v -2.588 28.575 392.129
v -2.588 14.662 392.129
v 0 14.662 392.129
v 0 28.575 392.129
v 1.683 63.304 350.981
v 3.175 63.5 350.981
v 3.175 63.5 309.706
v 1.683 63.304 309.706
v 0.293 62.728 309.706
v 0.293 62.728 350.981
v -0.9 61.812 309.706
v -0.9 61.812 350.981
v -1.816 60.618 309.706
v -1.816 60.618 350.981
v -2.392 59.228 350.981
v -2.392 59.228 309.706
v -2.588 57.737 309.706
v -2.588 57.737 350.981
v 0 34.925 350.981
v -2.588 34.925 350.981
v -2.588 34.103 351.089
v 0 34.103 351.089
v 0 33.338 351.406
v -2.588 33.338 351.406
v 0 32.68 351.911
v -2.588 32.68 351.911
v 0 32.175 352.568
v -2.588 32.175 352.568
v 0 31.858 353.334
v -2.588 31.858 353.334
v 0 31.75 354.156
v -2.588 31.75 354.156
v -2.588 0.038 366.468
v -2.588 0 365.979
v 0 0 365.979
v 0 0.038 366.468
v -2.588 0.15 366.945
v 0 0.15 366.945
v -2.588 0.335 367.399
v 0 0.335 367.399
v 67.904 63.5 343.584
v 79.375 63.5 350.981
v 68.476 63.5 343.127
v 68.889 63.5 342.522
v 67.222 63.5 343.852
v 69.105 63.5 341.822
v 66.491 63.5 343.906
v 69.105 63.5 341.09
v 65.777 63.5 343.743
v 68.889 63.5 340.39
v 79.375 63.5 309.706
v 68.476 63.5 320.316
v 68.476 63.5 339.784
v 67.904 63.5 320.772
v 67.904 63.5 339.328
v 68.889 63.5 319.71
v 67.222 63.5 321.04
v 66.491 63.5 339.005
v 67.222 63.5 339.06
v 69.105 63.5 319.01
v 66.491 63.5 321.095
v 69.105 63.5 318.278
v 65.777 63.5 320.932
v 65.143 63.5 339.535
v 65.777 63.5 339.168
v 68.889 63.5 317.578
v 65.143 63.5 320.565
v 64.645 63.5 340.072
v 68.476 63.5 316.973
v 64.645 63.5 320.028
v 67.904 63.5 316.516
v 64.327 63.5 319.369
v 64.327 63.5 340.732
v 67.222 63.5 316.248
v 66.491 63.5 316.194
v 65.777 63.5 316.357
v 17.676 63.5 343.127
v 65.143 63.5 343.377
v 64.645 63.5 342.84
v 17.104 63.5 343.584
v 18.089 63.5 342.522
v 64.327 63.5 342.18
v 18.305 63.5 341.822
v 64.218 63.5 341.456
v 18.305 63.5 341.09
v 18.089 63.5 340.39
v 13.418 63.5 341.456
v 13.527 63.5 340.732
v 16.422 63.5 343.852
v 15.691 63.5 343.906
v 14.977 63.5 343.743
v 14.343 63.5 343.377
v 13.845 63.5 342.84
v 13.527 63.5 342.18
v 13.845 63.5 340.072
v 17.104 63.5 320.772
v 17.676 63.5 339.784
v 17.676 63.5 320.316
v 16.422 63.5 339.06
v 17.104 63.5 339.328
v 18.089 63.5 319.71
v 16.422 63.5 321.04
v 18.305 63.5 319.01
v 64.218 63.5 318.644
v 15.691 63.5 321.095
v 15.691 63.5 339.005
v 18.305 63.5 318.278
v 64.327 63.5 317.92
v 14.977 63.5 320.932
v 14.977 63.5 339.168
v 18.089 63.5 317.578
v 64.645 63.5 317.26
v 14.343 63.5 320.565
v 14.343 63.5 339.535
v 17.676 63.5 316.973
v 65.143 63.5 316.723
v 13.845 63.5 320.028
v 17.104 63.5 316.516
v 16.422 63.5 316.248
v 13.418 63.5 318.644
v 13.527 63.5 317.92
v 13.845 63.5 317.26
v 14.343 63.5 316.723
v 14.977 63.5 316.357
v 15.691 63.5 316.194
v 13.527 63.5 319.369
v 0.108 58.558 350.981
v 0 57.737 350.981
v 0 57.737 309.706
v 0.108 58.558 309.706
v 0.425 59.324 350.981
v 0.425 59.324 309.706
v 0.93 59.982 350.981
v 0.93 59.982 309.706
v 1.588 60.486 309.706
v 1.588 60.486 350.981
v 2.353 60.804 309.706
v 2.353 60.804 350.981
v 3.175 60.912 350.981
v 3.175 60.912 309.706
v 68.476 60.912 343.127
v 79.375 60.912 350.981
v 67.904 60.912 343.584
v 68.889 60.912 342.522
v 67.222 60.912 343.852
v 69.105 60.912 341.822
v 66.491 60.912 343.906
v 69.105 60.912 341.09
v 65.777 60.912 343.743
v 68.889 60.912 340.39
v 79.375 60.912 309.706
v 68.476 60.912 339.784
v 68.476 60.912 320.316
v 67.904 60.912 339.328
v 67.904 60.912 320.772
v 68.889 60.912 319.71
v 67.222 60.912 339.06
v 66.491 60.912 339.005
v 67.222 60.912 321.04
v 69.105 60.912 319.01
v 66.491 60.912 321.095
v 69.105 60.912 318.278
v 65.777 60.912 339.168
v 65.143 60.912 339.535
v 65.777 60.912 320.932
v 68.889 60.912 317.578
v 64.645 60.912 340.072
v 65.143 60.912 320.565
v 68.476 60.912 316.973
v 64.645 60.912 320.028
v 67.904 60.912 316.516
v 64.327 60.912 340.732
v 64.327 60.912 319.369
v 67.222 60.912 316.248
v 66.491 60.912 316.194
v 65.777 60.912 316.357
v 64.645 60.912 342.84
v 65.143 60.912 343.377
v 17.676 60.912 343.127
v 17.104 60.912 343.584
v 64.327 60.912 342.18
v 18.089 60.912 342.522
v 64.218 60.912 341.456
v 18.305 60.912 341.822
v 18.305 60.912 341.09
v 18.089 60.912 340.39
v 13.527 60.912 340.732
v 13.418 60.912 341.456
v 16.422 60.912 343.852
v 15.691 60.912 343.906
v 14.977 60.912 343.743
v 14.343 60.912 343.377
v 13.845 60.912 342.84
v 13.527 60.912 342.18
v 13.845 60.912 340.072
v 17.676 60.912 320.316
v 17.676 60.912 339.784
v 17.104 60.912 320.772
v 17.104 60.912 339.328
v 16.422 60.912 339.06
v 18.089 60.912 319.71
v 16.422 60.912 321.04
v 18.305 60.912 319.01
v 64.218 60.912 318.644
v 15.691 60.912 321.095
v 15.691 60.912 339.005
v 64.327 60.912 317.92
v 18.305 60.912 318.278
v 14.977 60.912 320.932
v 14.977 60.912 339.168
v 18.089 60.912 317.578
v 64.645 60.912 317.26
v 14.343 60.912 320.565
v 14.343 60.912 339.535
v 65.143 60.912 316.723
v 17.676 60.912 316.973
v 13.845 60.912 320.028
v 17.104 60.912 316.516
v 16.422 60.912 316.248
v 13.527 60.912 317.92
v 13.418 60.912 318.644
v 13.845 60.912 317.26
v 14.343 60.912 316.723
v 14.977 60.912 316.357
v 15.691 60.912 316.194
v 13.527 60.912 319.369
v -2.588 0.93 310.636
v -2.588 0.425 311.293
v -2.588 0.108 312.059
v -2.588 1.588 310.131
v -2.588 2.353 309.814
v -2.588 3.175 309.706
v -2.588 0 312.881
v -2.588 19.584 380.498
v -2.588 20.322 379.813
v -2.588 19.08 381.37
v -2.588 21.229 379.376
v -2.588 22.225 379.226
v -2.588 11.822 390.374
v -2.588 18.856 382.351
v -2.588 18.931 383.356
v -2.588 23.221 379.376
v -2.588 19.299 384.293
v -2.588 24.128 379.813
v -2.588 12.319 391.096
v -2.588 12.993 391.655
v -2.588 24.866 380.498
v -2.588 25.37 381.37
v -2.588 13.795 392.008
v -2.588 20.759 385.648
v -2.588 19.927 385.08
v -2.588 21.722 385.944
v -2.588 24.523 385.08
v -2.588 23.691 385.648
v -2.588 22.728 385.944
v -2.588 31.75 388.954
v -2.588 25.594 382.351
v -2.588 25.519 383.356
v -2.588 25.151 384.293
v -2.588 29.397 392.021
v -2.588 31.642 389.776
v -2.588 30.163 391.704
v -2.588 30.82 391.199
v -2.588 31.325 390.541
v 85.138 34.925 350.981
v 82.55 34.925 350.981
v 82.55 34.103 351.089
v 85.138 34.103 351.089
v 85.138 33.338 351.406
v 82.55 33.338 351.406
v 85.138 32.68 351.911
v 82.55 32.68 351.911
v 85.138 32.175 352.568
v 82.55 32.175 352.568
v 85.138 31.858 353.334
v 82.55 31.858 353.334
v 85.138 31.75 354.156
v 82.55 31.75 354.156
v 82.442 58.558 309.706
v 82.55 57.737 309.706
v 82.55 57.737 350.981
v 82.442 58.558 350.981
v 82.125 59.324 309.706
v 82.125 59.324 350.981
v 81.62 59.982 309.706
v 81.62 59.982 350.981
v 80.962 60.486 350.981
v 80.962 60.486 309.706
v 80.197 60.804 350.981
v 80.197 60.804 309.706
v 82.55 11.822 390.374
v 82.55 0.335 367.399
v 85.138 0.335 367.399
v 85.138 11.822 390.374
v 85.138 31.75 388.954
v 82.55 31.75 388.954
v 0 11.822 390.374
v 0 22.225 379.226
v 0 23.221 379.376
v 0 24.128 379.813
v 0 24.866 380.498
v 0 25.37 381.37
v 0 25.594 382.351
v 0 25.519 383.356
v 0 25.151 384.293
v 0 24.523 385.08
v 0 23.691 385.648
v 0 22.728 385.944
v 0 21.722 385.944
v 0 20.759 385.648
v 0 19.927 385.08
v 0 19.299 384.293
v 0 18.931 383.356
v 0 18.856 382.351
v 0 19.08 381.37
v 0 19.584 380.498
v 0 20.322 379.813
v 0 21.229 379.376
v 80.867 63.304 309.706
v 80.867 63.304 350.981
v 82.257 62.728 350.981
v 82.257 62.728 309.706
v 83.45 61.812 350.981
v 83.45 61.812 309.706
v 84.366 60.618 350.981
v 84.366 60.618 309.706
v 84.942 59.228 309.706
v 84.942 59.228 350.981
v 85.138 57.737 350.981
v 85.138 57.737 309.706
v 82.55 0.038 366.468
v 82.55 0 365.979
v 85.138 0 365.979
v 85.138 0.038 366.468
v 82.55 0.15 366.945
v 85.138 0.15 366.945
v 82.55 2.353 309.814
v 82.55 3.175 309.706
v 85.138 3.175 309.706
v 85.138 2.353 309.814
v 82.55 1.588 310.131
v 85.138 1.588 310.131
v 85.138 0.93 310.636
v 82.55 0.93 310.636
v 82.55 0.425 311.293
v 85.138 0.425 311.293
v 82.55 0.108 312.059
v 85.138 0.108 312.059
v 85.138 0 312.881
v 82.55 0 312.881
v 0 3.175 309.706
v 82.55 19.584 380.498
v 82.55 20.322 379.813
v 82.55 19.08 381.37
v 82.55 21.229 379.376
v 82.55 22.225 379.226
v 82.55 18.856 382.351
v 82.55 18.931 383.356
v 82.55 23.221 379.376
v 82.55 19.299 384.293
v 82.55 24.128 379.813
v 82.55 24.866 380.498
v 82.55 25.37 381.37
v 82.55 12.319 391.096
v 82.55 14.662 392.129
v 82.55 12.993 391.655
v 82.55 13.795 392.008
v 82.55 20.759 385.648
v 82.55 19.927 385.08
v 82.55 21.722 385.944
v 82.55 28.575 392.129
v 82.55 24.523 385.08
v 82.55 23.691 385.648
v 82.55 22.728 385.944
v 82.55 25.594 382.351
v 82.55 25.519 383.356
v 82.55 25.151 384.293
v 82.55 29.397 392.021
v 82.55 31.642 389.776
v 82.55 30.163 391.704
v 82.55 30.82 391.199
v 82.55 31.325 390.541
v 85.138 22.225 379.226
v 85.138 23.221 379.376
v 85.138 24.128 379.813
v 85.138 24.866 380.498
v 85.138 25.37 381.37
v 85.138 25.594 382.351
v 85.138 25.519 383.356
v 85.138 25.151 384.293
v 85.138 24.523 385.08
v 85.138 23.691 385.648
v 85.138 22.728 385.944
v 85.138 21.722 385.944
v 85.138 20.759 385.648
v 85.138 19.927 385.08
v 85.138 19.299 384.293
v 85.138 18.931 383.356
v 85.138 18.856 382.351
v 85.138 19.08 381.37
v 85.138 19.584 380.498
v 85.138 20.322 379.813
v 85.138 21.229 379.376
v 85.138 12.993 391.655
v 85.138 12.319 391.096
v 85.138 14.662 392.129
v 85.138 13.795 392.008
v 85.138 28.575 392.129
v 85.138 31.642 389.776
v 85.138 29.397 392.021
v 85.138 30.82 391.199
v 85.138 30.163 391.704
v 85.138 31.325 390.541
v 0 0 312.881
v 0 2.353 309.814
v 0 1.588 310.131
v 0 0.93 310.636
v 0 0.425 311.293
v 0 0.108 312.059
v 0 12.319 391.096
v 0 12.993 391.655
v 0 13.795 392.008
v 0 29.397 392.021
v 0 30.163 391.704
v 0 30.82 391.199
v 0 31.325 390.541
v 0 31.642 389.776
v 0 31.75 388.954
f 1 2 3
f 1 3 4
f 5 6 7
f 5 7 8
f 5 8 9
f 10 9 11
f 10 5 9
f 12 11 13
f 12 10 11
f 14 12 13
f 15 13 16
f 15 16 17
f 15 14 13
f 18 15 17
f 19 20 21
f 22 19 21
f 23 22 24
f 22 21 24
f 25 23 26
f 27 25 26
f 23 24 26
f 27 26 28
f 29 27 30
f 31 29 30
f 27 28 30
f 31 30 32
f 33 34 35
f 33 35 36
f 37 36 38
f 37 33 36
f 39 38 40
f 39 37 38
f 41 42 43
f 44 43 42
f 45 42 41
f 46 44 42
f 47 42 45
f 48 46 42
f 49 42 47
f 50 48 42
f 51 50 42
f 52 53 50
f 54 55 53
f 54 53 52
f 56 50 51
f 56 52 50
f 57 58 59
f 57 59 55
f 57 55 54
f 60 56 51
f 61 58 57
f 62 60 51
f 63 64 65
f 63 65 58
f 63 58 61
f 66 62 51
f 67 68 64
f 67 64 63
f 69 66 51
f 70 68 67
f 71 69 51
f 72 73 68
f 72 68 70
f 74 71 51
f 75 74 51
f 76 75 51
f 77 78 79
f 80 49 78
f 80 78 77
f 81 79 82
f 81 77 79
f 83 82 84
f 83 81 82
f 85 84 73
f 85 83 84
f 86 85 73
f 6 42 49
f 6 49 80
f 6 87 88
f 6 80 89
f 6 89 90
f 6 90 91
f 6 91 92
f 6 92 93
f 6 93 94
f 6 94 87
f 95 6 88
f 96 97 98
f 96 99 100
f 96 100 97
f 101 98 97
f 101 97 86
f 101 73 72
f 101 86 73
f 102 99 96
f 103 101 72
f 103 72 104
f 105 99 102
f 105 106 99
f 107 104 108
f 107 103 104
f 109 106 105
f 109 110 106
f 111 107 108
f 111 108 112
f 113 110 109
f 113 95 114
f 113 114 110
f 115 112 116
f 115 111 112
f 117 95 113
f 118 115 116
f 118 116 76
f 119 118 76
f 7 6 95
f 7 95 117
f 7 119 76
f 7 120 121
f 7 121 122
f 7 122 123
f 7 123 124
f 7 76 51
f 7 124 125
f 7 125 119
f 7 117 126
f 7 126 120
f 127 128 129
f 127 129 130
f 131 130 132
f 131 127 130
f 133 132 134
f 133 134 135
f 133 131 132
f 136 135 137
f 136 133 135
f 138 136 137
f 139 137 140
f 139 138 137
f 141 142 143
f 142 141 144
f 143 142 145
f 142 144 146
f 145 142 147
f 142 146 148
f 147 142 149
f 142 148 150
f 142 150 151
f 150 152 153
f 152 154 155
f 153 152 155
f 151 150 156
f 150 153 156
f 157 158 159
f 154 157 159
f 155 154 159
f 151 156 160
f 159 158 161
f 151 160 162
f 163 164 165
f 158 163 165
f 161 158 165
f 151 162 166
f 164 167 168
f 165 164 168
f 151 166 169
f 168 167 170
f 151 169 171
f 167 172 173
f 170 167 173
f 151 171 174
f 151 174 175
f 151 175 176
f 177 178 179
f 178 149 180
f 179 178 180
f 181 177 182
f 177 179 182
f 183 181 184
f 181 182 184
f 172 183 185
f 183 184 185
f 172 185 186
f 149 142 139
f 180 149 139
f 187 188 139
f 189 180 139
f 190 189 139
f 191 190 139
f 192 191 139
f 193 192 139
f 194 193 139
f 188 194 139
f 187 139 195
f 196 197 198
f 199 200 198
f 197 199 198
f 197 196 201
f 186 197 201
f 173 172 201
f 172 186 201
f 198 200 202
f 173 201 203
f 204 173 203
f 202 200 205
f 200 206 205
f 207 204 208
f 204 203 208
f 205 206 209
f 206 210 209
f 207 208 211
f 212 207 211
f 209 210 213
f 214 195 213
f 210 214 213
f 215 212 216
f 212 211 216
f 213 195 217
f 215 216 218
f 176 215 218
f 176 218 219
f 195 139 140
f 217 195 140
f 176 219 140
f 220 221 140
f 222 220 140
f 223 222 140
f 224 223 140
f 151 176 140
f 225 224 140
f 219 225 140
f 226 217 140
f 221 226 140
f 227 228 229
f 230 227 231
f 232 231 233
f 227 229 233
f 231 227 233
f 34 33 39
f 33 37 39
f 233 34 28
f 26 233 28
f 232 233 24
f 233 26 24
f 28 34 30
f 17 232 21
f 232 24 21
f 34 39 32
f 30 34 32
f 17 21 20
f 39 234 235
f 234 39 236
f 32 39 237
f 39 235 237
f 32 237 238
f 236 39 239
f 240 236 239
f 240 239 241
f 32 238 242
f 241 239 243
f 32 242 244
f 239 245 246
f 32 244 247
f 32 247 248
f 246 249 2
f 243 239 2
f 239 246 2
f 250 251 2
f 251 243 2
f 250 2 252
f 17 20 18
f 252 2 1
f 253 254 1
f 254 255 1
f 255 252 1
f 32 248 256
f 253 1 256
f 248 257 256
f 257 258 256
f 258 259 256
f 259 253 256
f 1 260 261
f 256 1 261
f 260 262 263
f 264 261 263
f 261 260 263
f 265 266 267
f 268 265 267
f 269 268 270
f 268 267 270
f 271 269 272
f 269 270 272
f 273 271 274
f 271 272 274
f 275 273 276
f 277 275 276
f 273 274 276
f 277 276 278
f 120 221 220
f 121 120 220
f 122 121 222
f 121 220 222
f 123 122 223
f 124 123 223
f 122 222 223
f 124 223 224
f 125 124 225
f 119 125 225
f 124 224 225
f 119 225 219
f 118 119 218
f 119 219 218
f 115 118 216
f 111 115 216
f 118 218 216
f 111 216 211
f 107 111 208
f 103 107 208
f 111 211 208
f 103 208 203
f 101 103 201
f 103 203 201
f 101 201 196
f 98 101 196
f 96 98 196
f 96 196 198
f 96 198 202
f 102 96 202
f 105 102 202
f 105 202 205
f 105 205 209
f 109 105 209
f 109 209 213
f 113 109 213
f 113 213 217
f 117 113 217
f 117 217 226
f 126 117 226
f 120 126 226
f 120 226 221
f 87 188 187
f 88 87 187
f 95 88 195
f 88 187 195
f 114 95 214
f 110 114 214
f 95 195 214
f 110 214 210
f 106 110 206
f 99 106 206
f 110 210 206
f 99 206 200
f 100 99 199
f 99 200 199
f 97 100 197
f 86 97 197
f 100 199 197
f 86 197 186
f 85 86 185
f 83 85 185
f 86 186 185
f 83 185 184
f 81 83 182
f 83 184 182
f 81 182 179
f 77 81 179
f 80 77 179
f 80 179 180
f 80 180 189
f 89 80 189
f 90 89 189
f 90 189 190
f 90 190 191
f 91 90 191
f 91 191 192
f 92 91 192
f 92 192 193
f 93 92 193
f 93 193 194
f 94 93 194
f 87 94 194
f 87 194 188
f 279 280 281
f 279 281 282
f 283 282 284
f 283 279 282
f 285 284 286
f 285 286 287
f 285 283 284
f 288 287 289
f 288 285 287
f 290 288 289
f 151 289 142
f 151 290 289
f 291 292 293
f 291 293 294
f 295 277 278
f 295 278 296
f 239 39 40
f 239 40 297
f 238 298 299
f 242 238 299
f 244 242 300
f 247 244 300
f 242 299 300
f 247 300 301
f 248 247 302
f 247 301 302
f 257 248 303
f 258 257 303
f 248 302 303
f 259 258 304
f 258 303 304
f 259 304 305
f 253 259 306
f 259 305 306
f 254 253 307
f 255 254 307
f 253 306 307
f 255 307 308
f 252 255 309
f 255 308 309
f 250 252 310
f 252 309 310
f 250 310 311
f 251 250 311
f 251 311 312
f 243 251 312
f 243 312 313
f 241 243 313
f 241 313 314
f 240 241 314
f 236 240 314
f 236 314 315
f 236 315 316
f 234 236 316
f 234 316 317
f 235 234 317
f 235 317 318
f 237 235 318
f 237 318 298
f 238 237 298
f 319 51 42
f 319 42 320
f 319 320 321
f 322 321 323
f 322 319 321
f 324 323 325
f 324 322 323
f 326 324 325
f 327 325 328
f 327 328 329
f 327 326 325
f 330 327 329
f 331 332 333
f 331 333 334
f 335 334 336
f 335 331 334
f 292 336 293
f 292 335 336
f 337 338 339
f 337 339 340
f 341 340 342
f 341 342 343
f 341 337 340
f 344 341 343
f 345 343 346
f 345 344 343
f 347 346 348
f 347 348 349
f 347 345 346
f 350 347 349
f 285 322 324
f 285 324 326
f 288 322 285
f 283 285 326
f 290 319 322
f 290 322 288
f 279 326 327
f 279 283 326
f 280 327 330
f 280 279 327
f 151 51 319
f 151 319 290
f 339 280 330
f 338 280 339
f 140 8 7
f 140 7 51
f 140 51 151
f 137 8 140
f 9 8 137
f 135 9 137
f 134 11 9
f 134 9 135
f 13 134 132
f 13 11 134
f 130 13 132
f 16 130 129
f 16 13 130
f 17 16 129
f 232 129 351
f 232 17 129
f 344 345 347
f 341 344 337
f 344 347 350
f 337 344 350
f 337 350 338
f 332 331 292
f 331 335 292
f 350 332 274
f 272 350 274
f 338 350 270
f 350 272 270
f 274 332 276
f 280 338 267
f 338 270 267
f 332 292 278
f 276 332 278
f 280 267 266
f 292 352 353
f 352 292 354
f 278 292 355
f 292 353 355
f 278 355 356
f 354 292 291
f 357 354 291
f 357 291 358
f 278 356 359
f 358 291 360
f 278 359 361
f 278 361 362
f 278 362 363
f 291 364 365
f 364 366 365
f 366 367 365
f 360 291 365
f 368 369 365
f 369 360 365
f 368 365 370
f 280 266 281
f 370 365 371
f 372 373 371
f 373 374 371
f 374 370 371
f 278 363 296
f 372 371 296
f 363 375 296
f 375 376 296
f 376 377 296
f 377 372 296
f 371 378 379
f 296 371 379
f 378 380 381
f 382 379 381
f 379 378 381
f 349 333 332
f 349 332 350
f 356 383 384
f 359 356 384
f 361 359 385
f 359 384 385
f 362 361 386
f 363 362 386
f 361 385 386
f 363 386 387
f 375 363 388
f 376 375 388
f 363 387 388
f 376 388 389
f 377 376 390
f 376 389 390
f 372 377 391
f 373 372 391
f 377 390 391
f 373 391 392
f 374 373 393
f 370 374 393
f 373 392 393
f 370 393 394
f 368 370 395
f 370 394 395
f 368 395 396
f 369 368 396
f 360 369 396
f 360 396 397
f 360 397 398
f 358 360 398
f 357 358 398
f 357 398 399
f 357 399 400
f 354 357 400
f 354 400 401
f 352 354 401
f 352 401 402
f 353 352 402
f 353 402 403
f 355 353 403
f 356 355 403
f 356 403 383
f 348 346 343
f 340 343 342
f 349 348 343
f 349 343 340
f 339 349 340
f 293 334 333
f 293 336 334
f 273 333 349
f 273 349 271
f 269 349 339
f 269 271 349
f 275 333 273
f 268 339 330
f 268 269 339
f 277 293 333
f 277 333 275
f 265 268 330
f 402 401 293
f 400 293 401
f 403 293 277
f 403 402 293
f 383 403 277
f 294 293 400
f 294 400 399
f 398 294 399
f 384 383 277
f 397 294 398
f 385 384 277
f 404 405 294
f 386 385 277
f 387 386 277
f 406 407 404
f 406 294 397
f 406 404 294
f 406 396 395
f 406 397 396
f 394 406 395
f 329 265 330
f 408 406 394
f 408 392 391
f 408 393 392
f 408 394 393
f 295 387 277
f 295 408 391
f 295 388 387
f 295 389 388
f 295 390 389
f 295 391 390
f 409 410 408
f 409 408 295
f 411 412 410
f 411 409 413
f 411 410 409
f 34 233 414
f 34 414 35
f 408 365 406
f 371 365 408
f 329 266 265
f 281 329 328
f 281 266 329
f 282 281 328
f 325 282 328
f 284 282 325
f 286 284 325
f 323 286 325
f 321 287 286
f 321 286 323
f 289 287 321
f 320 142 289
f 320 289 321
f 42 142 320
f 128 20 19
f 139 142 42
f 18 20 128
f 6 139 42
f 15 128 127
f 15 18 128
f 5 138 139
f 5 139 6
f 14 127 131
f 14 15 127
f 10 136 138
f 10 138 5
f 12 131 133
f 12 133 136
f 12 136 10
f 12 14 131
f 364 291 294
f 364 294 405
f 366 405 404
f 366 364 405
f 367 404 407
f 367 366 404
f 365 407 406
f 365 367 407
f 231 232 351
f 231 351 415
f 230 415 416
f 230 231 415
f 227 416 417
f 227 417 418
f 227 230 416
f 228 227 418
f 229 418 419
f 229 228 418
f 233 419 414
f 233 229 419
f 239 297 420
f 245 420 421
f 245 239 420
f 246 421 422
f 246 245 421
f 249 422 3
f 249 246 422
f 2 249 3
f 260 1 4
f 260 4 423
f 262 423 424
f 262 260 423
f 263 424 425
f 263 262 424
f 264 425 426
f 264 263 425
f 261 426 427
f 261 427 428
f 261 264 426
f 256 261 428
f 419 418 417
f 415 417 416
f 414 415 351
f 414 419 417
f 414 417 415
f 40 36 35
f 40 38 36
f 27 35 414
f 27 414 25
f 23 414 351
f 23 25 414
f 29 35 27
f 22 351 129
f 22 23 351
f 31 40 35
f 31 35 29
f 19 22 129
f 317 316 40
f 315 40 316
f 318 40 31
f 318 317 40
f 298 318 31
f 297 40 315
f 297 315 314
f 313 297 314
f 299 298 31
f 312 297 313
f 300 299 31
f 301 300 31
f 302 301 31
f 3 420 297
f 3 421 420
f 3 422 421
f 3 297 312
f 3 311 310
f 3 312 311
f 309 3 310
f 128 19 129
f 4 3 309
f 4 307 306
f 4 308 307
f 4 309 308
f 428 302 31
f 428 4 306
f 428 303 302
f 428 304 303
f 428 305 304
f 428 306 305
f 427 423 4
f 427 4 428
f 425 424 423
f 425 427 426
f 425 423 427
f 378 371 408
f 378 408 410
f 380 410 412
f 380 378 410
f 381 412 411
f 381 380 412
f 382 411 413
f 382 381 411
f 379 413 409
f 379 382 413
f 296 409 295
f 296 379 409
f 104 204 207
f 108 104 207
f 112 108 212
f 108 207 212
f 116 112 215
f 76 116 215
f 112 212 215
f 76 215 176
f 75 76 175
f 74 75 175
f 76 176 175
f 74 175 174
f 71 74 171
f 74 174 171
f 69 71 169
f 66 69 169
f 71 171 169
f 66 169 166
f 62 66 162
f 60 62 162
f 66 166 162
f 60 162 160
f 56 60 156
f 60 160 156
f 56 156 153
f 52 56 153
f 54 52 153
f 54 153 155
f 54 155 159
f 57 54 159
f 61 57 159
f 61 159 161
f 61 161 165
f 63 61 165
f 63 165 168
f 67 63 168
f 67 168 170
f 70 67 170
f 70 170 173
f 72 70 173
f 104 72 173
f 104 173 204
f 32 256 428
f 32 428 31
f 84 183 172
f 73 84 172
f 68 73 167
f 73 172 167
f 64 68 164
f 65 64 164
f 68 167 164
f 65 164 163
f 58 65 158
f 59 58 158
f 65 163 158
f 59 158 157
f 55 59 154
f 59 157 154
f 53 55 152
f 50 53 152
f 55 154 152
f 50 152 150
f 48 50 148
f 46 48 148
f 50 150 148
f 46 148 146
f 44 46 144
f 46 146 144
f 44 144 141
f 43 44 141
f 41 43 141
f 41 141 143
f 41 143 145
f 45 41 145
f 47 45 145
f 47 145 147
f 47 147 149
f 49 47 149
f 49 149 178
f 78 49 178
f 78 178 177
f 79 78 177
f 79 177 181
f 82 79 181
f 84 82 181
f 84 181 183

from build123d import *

# Parameters (mm, degrees)
SKETCH1_W                    = 41.275
SKETCH1_H                    = 2.58826
BASE_FLANGE1_DEPTH           = 82.55
EDGE_FLANGE1_STRIP_W         = 16.70304
EDGE_FLANGE1_STRIP_H         = 2.58826
EDGE_FLANGE1_STRIP_CUT_DEPTH = 41.275
EDGE_FLANGE1_DEPTH           = 41.275
EDGE_FLANGE1_START           = 2.58826
EDGE_FLANGE1_FLAT_DEPTH      = 2.58826
EDGE_FLANGE2_STRIP_W         = 16.70304
EDGE_FLANGE2_STRIP_H         = 2.58826
EDGE_FLANGE2_STRIP_CUT_DEPTH = 41.275
EDGE_FLANGE2_DEPTH           = 41.275
EDGE_FLANGE2_START           = 2.58826
EDGE_FLANGE2_FLAT_DEPTH      = 2.58826
F_1_4_CLEARANCE_HOLE1_D      = 6.7564
F_10_0_1935_DIAMETER_HOLE1_D = 4.9149
SKETCH19_W                   = 9.191105822
SKETCH19_H                   = 31.75
CUT_EXTRUDE1_DEPTH           = 416.675275559
FILLET2_START                = -2.58826
FILLET2_DEPTH                = 87.72652
FILLET2_2_DEPTH              = 2.58826
FILLET2_START_2              = 82.55
FILLET2_3_DEPTH              = 2.58826


with BuildPart() as part:
    # Base-Flange1: sheet metal written as solids
    # Sketch1 → Base-Flange1 (new body)
    with BuildSketch(Plane(origin=(0, 0, 0), x_dir=(0, 0, -1), z_dir=(1, 0, 0))):
        with Locations((-330.343394178, 62.20587)):
            Rectangle(SKETCH1_W, SKETCH1_H)
    extrude(amount=BASE_FLANGE1_DEPTH)

    # Edge-Flange1: sheet metal written as solids
    # Edge-Flange1 strip (on a plane across the edge) → Edge-Flange1 strip cut (cut)
    with BuildSketch(Plane(origin=(82.55, 60.91174, 309.705894178), x_dir=(-1, 0, 0), z_dir=(0, 0, 1))):
        with Locations((-5.17652, -1.29413)):
            Rectangle(EDGE_FLANGE1_STRIP_W, EDGE_FLANGE1_STRIP_H)
    extrude(amount=EDGE_FLANGE1_STRIP_CUT_DEPTH, mode=Mode.SUBTRACT)

    # Edge-Flange1 bend section (on a plane across the edge) → Edge-Flange1 (add)
    with BuildSketch(Plane(origin=(82.55, 60.91174, 309.705894178), x_dir=(-1, 0, 0), z_dir=(0, 0, 1))):
        with BuildLine():
            Line((-2.58826, 3.175), (0, 3.175))
            ThreePointArc((0, 3.175), (0.92993597, 0.92993597), (3.175, 0))
            Line((3.175, 0), (3.175, -2.58826))
            ThreePointArc((3.175, -2.58826), (-0.900240228, -0.900240228), (-2.58826, 3.175))
        make_face()
    extrude(amount=EDGE_FLANGE1_DEPTH)

    # Edge-Flange1 profile (on flange) → Edge-Flange1 flat (add)
    with BuildSketch(Plane(origin=(82.55, 60.91174, 0), x_dir=(0, 0, 1), z_dir=(1, 0, 0)).offset(EDGE_FLANGE1_START)):
        Polygon((350.980894178, 3.175), (350.980894178, 12.7), (350.980894178, 29.16174), (401.32, 29.16174), (401.32, 60.91174), (309.705894178, 60.91174), (309.705894178, 12.7), (309.705894178, 3.175), align=None)
    extrude(amount=-EDGE_FLANGE1_FLAT_DEPTH)

    # Edge-Flange2: sheet metal written as solids
    # Edge-Flange2 strip (on a plane across the edge) → Edge-Flange2 strip cut (cut)
    with BuildSketch(Plane(origin=(0, 60.91174, 350.980894178), x_dir=(1, 0, 0), z_dir=(0, 0, -1))):
        with Locations((-5.17652, -1.29413)):
            Rectangle(EDGE_FLANGE2_STRIP_W, EDGE_FLANGE2_STRIP_H)
    extrude(amount=EDGE_FLANGE2_STRIP_CUT_DEPTH, mode=Mode.SUBTRACT)

    # Edge-Flange2 bend section (on a plane across the edge) → Edge-Flange2 (add)
    with BuildSketch(Plane(origin=(0, 60.91174, 350.980894178), x_dir=(1, 0, 0), z_dir=(0, 0, -1))):
        with BuildLine():
            Line((-2.58826, 3.175), (0, 3.175))
            ThreePointArc((0, 3.175), (0.92993597, 0.92993597), (3.175, 0))
            Line((3.175, 0), (3.175, -2.58826))
            ThreePointArc((3.175, -2.58826), (-0.900240228, -0.900240228), (-2.58826, 3.175))
        make_face()
    extrude(amount=EDGE_FLANGE2_DEPTH)

    # Edge-Flange2 profile (on flange) → Edge-Flange2 flat (add)
    with BuildSketch(Plane(origin=(0, 60.91174, 0), x_dir=(0, 0, -1), z_dir=(-1, 0, 0)).offset(EDGE_FLANGE2_START)):
        Polygon((-350.980894178, 12.7), (-350.980894178, 3.175), (-309.705894178, 3.175), (-309.705894178, 12.7), (-309.705894178, 60.91174), (-401.32, 60.91174), (-401.32, 29.16174), (-350.980894178, 29.16174), align=None)
    extrude(amount=-EDGE_FLANGE2_FLAT_DEPTH)

    # 1/4 Clearance Hole1 (through all)
    with Locations(Plane.ZY.offset(2.58826)):
        with Locations((382.603894178, 22.225)):
            Hole(F_1_4_CLEARANCE_HOLE1_D / 2)

    # #10 (0.1935) Diameter Hole1 (through all)
    with Locations(Plane(origin=(0, 63.5, 0), x_dir=(1, 0, 0), z_dir=(0, 1, 0))):
        with Locations((15.875, -318.644154178), (15.875, -341.455894178), (66.675, -341.455894178), (66.675, -318.644154178)):
            Hole(F_10_0_1935_DIAMETER_HOLE1_D / 2)

    # Sketch19 → Cut-Extrude1 (cut, through all)
    with BuildSketch(Plane.ZY.offset(2.58826)):
        with Locations((396.724447089, 15.875)):
            Rectangle(SKETCH19_W, SKETCH19_H)
    extrude(amount=-CUT_EXTRUDE1_DEPTH, mode=Mode.SUBTRACT)

    # Fillet2: read off the stored shape, not the designer's step
    # Fillet2 outline → Fillet2 (cut)
    with BuildSketch(Plane.YZ.offset(FILLET2_START)):
        with BuildLine():
            ThreePointArc((0, 365.97937835), (0.084934458, 366.708843873), (0.335193669, 367.399281516))
            Line((0.335193669, 367.399281516), (11.822451583, 390.373797344))
            ThreePointArc((11.822451583, 390.373797344), (12.993061633, 391.654710495), (14.662257914, 392.128894178))
            Line((14.662257914, 392.128894178), (0, 392.128894178))
            Line((0, 392.128894178), (0, 365.97937835))
        make_face()
        with BuildLine():
            ThreePointArc((3.175, 309.705894178), (0.92993597, 310.635830148), (0, 312.880894178))
            Line((0, 312.880894178), (0, 309.705894178))
            Line((0, 309.705894178), (3.175, 309.705894178))
        make_face()
        with BuildLine():
            Line((31.75, 392.128894178), (28.575, 392.128894178))
            ThreePointArc((28.575, 392.128894178), (30.820064031, 391.198958209), (31.75, 388.953894178))
            Line((31.75, 388.953894178), (31.75, 392.128894178))
        make_face()
    extrude(amount=FILLET2_DEPTH, mode=Mode.SUBTRACT)

    # Fillet2 2 outline → Fillet2 2 (add)
    with BuildSketch(Plane.YZ.offset(FILLET2_START)):
        with BuildLine():
            ThreePointArc((34.925, 350.980894178), (32.67993597, 351.910830148), (31.75, 354.155894178))
            Line((31.75, 354.155894178), (31.75, 350.980894178))
            Line((31.75, 350.980894178), (34.925, 350.980894178))
        make_face()
    extrude(amount=FILLET2_2_DEPTH)

    # Fillet2 3 outline → Fillet2 3 (add)
    with BuildSketch(Plane.YZ.offset(FILLET2_START_2)):
        with BuildLine():
            ThreePointArc((34.925, 350.980894178), (32.67993597, 351.910830148), (31.75, 354.155894178))
            Line((31.75, 354.155894178), (31.75, 350.980894178))
            Line((31.75, 350.980894178), (34.925, 350.980894178))
        make_face()
    extrude(amount=FILLET2_3_DEPTH)


solid = part.part
